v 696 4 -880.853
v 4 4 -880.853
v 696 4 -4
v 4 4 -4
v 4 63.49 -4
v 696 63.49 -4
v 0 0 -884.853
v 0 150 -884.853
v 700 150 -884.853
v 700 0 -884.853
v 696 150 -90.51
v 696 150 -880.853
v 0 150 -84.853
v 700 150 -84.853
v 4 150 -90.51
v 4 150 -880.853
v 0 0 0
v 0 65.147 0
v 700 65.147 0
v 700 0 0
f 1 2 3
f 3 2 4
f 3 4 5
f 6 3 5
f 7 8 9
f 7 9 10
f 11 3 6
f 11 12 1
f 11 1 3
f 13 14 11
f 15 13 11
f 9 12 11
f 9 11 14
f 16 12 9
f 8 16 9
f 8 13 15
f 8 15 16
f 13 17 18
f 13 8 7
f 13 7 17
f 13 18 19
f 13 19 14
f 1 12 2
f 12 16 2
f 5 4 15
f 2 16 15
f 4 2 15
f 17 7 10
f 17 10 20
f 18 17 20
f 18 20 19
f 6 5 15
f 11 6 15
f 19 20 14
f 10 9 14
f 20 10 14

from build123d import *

# Parameters (mm, degrees)
BOSS_EXTRUDE1_DEPTH = 700
SHELL1_T            = -4


with BuildPart() as part:
    # Sketch2 → Boss-Extrude1 (new body)
    with BuildSketch(Plane(origin=(0, 0, 0), x_dir=(0, 0, -1), z_dir=(1, 0, 0))):
        Polygon((0, 0), (0, 65.147186258), (84.852813742, 150), (884.852813742, 150), (884.852813742, 0), align=None)
    extrude(amount=BOSS_EXTRUDE1_DEPTH)

    # Shell1
    shell1_openings = [part.faces().sort_by_distance(p)[0] for p in [
        (350, 150, -484.852813742),
    ]]
    offset(amount=SHELL1_T, openings=shell1_openings, kind=Kind.INTERSECTION)


solid = part.part
